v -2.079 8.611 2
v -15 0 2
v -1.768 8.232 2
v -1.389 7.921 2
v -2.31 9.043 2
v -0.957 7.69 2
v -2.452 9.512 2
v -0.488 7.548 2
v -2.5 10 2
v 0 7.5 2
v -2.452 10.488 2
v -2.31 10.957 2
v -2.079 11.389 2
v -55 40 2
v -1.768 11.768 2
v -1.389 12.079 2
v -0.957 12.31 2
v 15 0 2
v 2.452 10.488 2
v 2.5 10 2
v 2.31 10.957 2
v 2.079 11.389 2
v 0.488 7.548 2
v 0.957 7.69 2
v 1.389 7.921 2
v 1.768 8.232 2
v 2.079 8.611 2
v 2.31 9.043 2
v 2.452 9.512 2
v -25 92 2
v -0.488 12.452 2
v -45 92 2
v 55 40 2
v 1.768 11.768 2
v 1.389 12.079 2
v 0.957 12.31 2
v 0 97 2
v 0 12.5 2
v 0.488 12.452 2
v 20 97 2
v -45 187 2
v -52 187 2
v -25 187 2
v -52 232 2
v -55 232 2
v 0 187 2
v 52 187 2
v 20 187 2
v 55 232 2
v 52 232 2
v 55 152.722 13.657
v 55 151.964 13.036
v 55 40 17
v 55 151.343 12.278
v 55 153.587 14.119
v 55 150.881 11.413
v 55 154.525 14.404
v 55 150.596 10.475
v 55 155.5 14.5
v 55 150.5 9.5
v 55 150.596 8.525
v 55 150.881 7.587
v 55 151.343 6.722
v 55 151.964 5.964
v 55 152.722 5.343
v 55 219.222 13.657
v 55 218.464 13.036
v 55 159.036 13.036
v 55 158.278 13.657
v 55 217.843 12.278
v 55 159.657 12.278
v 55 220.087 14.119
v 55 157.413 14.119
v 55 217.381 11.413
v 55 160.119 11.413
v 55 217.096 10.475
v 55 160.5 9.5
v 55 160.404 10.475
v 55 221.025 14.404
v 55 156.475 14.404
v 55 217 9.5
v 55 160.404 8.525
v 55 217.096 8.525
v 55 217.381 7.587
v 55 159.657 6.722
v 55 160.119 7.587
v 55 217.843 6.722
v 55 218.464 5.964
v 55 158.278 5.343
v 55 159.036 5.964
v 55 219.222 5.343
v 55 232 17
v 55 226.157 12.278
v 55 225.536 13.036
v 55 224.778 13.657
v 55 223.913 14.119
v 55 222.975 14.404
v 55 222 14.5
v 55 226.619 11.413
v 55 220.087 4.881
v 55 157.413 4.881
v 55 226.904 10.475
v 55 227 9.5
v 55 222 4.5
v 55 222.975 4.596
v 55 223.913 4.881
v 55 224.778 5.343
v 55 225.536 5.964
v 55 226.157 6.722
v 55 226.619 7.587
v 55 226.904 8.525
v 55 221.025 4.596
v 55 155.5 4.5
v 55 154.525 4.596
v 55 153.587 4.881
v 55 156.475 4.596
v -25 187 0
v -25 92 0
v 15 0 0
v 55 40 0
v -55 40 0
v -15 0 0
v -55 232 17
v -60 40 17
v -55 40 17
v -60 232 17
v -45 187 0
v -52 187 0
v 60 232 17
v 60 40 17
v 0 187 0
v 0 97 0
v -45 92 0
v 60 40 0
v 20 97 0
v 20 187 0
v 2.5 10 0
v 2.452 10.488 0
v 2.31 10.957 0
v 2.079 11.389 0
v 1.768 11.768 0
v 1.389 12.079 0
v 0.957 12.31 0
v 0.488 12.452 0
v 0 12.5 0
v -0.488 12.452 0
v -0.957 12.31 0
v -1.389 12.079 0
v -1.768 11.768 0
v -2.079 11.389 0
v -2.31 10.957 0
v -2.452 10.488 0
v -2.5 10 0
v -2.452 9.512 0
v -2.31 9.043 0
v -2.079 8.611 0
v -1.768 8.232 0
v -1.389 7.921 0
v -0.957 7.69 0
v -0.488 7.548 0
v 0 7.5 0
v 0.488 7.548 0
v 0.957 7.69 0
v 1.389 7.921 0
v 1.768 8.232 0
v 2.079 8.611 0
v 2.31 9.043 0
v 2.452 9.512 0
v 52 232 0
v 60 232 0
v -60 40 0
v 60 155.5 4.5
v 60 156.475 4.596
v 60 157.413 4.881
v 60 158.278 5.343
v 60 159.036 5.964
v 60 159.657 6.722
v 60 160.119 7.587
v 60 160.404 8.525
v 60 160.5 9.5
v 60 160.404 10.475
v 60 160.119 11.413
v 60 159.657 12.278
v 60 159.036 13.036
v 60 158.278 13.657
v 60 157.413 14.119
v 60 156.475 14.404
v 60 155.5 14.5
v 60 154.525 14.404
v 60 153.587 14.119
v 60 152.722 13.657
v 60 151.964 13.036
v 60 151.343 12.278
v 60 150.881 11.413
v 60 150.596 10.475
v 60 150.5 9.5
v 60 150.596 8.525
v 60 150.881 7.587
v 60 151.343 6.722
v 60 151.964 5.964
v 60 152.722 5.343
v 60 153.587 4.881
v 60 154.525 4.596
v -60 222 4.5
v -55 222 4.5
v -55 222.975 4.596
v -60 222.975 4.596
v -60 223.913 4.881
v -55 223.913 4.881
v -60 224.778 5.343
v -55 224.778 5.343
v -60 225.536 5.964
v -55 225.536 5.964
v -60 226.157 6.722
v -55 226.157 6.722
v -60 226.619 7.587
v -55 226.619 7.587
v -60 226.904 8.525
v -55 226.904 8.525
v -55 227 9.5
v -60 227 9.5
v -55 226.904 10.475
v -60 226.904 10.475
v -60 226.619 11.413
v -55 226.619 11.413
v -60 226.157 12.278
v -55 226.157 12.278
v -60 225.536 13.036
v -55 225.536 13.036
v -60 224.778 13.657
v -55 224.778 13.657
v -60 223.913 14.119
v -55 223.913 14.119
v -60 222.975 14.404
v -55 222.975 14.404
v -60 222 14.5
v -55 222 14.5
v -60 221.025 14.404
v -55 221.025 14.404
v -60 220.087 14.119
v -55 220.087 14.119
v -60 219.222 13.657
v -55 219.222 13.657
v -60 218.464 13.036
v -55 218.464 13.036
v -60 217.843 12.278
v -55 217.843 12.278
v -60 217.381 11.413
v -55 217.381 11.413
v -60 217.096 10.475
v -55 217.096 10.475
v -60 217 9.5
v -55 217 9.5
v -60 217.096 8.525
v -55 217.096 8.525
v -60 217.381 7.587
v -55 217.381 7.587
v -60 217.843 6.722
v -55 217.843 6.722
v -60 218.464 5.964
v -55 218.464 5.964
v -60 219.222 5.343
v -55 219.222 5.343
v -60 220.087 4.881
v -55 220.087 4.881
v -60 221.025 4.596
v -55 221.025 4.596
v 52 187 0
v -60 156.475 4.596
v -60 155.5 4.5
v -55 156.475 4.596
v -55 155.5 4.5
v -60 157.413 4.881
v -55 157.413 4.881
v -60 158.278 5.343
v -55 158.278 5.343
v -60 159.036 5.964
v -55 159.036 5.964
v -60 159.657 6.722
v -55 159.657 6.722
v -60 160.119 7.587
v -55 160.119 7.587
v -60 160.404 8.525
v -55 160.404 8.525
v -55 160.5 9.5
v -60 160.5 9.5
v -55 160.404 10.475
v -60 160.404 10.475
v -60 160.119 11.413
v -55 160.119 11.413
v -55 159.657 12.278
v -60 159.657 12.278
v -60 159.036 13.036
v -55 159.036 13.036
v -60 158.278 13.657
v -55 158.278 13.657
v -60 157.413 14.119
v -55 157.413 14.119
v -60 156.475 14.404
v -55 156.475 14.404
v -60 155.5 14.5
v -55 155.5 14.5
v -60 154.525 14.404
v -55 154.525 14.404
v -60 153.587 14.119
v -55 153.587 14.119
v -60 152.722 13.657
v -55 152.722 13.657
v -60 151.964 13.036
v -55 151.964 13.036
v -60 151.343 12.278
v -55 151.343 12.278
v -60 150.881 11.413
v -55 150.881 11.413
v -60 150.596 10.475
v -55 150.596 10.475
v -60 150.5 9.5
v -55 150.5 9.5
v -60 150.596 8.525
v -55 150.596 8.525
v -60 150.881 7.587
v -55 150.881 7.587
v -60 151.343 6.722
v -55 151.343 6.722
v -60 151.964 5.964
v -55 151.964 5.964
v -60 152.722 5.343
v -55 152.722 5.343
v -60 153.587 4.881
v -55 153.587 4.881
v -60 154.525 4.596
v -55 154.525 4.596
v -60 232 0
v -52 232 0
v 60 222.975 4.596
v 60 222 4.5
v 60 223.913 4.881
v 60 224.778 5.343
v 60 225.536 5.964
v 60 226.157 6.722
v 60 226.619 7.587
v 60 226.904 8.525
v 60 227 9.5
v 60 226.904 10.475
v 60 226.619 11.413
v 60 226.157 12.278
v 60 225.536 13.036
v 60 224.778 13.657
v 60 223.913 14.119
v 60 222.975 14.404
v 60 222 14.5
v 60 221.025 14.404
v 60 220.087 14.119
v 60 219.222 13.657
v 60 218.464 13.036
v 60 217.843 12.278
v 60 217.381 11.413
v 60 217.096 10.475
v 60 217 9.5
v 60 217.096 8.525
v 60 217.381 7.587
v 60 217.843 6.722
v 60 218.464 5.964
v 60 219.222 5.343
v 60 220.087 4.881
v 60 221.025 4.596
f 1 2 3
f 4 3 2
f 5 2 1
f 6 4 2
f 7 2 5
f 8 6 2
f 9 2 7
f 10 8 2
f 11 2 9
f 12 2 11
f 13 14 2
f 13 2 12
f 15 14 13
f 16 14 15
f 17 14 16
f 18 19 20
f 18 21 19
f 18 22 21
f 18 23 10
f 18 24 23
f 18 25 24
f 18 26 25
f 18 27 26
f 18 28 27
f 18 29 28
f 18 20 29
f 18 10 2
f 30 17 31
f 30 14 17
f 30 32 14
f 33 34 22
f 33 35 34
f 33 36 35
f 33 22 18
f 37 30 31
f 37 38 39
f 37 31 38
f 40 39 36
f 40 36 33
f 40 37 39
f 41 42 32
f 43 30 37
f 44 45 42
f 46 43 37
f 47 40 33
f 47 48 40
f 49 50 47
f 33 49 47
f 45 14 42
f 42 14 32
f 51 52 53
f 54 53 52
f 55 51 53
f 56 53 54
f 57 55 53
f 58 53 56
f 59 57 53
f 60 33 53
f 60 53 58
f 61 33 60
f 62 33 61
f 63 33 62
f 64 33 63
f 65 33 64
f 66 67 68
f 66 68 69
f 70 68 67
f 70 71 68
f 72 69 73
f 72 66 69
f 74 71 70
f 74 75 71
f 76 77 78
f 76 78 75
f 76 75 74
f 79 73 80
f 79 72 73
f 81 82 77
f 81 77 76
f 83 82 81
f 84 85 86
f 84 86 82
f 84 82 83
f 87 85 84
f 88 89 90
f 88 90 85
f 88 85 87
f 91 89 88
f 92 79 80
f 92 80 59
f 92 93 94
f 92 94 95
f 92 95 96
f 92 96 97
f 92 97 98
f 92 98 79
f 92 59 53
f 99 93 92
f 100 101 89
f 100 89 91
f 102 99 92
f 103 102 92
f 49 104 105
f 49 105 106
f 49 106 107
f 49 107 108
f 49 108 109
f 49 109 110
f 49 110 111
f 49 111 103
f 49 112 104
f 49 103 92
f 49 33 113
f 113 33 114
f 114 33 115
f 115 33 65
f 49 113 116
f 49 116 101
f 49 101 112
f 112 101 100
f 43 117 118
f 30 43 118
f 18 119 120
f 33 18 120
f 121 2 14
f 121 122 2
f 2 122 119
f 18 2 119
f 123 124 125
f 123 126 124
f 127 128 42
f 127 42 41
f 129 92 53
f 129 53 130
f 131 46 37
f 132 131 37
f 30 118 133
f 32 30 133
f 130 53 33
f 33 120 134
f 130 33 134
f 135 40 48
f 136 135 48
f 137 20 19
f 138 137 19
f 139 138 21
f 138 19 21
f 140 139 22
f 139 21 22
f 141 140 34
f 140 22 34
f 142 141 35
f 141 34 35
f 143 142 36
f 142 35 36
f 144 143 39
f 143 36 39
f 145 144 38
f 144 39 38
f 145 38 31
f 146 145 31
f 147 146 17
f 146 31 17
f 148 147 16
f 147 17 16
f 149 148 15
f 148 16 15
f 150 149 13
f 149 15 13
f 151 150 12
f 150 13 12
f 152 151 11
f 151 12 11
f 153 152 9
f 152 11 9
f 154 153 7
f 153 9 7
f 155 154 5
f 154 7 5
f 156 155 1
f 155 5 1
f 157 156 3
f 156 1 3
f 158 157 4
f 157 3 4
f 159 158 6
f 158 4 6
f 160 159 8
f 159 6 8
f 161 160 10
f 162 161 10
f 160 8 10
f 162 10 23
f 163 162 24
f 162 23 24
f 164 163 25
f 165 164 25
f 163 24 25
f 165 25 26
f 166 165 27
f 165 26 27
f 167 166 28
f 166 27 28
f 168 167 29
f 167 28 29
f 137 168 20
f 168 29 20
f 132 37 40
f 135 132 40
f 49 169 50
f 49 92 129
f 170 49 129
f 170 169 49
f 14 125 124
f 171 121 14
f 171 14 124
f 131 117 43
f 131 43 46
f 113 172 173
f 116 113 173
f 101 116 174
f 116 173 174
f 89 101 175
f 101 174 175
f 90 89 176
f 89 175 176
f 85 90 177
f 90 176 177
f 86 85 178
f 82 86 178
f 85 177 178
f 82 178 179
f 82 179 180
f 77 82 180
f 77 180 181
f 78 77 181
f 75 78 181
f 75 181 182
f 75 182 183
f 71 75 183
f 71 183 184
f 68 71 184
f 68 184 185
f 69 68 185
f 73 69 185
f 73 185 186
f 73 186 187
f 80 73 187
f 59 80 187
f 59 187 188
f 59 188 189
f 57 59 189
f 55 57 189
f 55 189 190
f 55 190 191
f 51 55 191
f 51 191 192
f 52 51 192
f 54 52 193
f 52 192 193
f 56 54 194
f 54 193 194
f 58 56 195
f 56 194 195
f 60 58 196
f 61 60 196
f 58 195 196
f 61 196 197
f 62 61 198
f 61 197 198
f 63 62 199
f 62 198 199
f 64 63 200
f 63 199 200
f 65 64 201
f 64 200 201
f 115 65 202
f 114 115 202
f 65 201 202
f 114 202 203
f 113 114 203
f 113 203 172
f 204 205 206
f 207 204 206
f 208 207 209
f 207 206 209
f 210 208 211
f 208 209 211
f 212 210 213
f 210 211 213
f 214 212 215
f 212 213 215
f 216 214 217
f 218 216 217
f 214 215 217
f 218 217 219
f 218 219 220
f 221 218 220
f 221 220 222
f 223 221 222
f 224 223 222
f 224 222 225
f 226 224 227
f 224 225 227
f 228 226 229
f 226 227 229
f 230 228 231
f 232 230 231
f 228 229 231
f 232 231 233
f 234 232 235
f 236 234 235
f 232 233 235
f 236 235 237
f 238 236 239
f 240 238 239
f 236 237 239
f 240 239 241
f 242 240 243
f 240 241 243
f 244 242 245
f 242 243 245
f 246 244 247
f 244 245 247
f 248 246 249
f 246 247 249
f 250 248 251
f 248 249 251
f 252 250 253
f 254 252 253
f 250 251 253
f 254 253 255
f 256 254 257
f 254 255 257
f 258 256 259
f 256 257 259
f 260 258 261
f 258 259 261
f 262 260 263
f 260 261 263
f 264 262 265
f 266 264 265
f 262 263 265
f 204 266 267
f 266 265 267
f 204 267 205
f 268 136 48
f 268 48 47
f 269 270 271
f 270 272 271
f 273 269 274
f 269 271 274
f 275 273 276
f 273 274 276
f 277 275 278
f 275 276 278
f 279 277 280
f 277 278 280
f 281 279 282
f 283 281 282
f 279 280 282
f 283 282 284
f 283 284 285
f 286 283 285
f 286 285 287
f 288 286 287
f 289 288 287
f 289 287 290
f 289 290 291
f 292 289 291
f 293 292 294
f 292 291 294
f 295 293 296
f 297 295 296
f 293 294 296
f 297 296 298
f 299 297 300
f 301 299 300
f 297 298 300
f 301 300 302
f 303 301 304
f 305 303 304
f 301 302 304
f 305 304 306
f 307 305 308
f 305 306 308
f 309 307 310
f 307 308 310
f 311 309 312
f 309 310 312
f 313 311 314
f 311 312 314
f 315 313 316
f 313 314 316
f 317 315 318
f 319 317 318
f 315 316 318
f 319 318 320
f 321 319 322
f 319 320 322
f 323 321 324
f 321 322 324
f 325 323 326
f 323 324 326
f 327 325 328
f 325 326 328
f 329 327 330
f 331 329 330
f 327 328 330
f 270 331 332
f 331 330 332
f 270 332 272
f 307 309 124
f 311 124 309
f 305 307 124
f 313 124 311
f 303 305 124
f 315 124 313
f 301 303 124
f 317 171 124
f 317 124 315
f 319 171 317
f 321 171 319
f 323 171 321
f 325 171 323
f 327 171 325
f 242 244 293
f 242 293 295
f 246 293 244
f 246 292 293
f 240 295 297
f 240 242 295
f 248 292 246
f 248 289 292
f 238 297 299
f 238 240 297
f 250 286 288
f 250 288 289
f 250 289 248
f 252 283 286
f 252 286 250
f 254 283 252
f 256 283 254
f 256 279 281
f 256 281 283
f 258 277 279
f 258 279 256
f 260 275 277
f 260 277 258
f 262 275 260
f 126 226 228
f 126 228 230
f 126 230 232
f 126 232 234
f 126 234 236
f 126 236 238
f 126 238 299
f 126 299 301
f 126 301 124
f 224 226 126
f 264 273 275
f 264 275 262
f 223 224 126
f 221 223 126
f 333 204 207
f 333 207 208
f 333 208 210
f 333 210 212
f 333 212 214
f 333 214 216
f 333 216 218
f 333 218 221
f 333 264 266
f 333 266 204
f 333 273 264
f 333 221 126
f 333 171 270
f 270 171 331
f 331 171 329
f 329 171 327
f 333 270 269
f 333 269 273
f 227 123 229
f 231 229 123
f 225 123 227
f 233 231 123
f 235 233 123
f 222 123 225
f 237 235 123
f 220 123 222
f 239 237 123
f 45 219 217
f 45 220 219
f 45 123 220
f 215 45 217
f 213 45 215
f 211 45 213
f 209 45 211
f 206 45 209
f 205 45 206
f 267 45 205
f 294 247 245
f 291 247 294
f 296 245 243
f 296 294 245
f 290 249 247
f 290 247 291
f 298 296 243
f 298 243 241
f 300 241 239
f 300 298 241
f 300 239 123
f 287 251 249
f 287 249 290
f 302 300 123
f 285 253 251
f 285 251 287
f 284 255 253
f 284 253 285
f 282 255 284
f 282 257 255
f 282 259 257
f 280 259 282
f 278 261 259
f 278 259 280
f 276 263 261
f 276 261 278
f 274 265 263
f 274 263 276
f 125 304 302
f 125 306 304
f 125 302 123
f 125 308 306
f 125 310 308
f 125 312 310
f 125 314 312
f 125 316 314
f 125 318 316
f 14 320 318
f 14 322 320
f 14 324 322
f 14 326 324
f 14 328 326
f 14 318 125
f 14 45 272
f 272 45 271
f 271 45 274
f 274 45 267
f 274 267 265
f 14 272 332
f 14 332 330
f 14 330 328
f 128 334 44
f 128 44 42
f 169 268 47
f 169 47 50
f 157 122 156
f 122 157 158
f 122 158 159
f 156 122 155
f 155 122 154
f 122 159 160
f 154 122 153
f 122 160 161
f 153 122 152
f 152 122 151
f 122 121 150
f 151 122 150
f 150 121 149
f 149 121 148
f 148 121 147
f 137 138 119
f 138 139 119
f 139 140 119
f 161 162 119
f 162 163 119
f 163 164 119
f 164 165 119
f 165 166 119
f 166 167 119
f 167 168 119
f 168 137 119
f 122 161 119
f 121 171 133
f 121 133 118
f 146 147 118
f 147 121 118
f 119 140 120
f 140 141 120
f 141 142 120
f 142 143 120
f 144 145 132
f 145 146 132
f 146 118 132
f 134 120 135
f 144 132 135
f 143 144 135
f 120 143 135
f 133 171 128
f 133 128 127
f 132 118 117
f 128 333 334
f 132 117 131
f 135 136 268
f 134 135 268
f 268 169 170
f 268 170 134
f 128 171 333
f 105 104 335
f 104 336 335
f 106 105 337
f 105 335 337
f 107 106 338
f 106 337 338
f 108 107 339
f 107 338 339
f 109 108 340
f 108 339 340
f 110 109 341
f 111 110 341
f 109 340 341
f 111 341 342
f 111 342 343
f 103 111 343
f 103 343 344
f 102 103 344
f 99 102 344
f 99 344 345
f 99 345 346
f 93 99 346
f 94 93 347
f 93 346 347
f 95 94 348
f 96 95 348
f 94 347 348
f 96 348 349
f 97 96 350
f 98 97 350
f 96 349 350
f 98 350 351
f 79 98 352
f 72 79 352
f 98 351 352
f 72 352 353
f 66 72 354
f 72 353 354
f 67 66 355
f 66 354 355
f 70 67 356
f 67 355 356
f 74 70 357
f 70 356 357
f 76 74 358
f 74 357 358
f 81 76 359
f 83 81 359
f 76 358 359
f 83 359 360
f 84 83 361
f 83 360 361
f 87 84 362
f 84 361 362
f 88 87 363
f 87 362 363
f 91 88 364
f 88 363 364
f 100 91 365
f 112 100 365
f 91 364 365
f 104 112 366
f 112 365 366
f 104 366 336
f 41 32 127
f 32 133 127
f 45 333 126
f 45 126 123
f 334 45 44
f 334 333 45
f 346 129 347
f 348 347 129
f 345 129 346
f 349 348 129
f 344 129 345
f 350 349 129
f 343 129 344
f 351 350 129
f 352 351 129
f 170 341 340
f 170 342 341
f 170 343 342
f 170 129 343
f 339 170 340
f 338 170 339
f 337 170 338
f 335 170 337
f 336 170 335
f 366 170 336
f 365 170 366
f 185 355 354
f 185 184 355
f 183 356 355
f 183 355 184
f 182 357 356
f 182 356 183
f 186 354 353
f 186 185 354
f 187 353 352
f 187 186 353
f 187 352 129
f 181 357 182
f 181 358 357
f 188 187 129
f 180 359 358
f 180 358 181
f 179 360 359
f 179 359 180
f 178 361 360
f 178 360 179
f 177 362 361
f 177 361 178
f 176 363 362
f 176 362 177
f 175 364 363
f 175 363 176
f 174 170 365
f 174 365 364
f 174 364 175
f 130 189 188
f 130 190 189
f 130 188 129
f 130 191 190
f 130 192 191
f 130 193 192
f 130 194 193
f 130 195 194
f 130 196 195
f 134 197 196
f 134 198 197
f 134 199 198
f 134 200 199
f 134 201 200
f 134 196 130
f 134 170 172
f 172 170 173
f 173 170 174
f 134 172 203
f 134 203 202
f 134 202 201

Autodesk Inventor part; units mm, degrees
ref_plane "YZ Plane" through (0, 0, 0) normal (1, 0, 0) x (0, 1, 0)
ref_plane "XZ Plane" through (0, 0, 0) normal (0, 1, 0) x (-1, 0, 0)
sketch "草图1" plane through (0, 0, 0) normal (0, 0, 1) x (1, 0, 0)
  line L0 (-60, 0) -> (60, 0)
  line L1 (-60, 0) -> (-60, 232)
  line L2 (-60, 232) -> (60, 232)
  line L3 (60, 232) -> (60, 0)
  point P0 (0, 0)
  point P1 (0, 0)
  dimension "宽度" = 120
  dimension "长度" = 232
  dimension "d15" = 120
extrude "拉伸1" add sketch "草图1" along normal blind 2
sketch "草图2" plane through (0, 0, 2) normal (0, 0, 1) x (1, 0, 0)
  line L0 (-60, 0) -> (60, 0) projected
  line L1 (60, 0) -> (60, 232) projected
  line L2 (60, 232) -> (-60, 232) projected
  line L3 (-60, 232) -> (-60, 0) projected
  line L4 (-55, 232) -> (-55, 0)
  line L5 (0, 0) -> (0, 232) construction
  line L6 (55, 0) -> (55, 232)
  dimension "侧厚" = 5
extrude "拉伸2" add sketch "草图2" along normal blind 15 contours L3 L2 L4 L0 | L6 L2 L1 L0
sketch "草图3" plane through (60, 0, 0) normal (1, 0, 0) x (0, 0, -1)
  line L0 (0, 0) -> (0, 232) projected
  line L1 (0, 232) -> (-17, 232) projected
  line L2 (-17, 0) -> (-17, 232) projected
  line L3 (0, 0) -> (-17, 0) projected
  circle A0 centre (-9.5, 222) radius 5
  circle A1 centre (-9.5, 155.5) radius 5
  line L4 (-9.5, 222) -> (-9.5, 155.5) construction
  point P0 (0, 0)
  dimension "d16" = 10
  dimension "后孔位置" = 10
  dimension "上沿" = 7.5
  dimension "d29" = 10
  dimension "d30" = 66.5
extrude "拉伸3" cut sketch "草图3" against normal through all contours A0
sketch "草图4" plane through (0, 0, 2) normal (0, 0, 1) x (1, 0, 0)
  line L0 (-52, 232) -> (-52, 187)
  line L1 (-52, 187) -> (52, 187)
  line L2 (52, 187) -> (52, 232)
  line L3 (55, 232) -> (-55, 232)
  line L4 (0, 232) -> (0, 179.736464)
  line L5 (-52, 232) -> (52, 232)
  line L6 (55, 232) -> (55, 0)
  point P0 (0, 0)
  dimension "d26" = 45
  dimension "d39" = 3
extrude "拉伸4" cut sketch "草图4" along normal through all both and the other way through all
extrude "拉伸5" cut sketch "草图3" against normal through all contours A1
sketch "草图5" plane through (0, 0, 2) normal (0, 0, 1) x (1, 0, 0)
  line L0 (-55, 0) -> (-55, 232) projected
  line L1 (-52, 232) -> (-55, 232) projected
  line L2 (-45, 232) -> (-45, 92)
  line L3 (-25, 232) -> (-25, 92)
  line L4 (-45, 92) -> (-25, 92)
  point P0 (0, 0)
  dimension "d33" = 140
  dimension "d34" = 10
  dimension "d35" = 140
  dimension "d36" = 20
sketch "草图5 outline for 拉伸6" plane through (0, 0, 2) normal (0, 0, 1) x (1, 0, 0)
  line L0 (-45, 232) -> (-25, 232)
  line L1 (-25, 232) -> (-25, 92)
  line L2 (-25, 92) -> (-45, 92)
  line L3 (-45, 92) -> (-45, 232)
extrude "拉伸6" cut sketch "草图5 outline for 拉伸6" along normal through all both and the other way through all
sketch "草图6" plane through (0, 0, 2) normal (0, 0, 1) x (1, 0, 0)
  line L0 (60, 160.5) -> (60, 150.5) projected
  line L1 (55, 150.5) -> (55, 160.5) projected
  line L2 (55, 155.5) -> (0, 155.5) construction
  line L3 (0, 145.5) -> (0, 0) construction
  line L4 (55, 155.5) -> (55, 95.5) construction
  line L5 (55, 95.5) -> (0, 95.5) construction
  line L6 (-10, 95.5) -> (10, 95.5)
  line L7 (52, 187) -> (-25, 187) projected
  line L8 (10, 145.5) -> (10, 177) construction
  line L9 (0, 187) -> (0, 97)
  line L10 (0, 97) -> (20, 97)
  line L11 (20, 97) -> (20, 187)
  dimension "d40" = 60
  dimension "d46" = 90
  dimension "d47" = 20
  dimension "d48" = 10
extrude "拉伸7" cut sketch "草图6" against normal through all
sketch "草图7" plane through (0, 0, 2) normal (0, 0, 1) x (1, 0, 0)
  line L0 (60, 227) -> (60, 217) projected
  line L1 (55, 217) -> (55, 227) projected
  line L2 (-60, 232) -> (-60, 0) projected
  line L3 (60, 0) -> (60, 232) projected
  line L4 (-60, 0) -> (60, 0) projected
  line L5 (55, 222) -> (60, 222) construction
  circle A0 centre (0, 10) radius 2.5
  point P0 (0, 0)
  dimension "d49" = 5
  dimension "d50" = 212
extrude "拉伸8" cut sketch "草图7" against normal through all
sketch "草图8" plane through (0, 0, 2) normal (0, 0, 1) x (1, 0, 0)
  circle A0 centre (0, 10) radius 2.5
  line L0 (20, 187) -> (20, 97)
  line L1 (20, 97) -> (0, 97)
  line L2 (0, 97) -> (0, 187)
  line L3 (0, 187) -> (-25, 187)
  line L4 (-25, 187) -> (-25, 92)
  line L5 (-25, 92) -> (-45, 92)
  line L6 (-45, 92) -> (-45, 187)
  line L7 (-45, 187) -> (-52, 187)
  line L8 (-52, 187) -> (-52, 232)
  line L9 (-52, 232) -> (-55, 232)
  line L10 (-55, 232) -> (-55, 0)
  line L11 (-55, 0) -> (55, 0)
  line L12 (55, 0) -> (55, 232)
  line L13 (55, 232) -> (52, 232)
  line L14 (52, 232) -> (52, 187)
  line L15 (52, 187) -> (20, 187)
  line L16 (-60, 0) -> (-55, 0)
  line L17 (-55, 0) -> (-55, 232)
  line L18 (-55, 232) -> (-60, 232)
  line L19 (-60, 232) -> (-60, 0)
  line L20 (60, 0) -> (60, 232)
  line L21 (60, 232) -> (55, 232)
  line L22 (55, 232) -> (55, 0)
  line L23 (55, 0) -> (60, 0)
  line L24 (-15, 0) -> (-55, 40)
  line L25 (15, 0) -> (55, 40)
  line L26 (0, 0) -> (0, 39.183664) construction
  line L27 (-60, 232) -> (-60, 0)
  line L28 (-55, 40) -> (-60, 40)
  line L29 (-60, 40) -> (-60, 0)
  line L30 (-60, 0) -> (-15, 0)
  line L31 (15, 0) -> (60, 0)
  line L32 (55, 40) -> (60, 40)
  line L33 (60, 0) -> (60, 40)
  dimension "d53" = 30
  dimension "d55" = 40
extrude "拉伸9" cut sketch "草图8" along normal through all both and the other way through all contours L32 L20 L23 L12 | L12 L11 L25 | L11 L10 L24 | L16 L19 L28 L10
ref_plane "工作平面1" through (31, 232, 17) normal (1, 0, 0) x (0, 0, -1)
sketch "草图9" plane through (31, 232, 17) normal (1, 0, 0) x (0, 0, -1)
  line L0 (17, -192) -> (17, 0)
  line L1 (17, -56.209089) -> (-323, -175.94833)
  line L2 (-322.950917, -180.94833) -> (17, -61.209089)
  line L3 (17, -56.209089) -> (17, -61.209089)
  line L4 (-322.950917, -180.94833) -> (-323, -175.94833)
  point P0 (17, -232)
  dimension "d59" = 340
  dimension "d64" = 5
  dimension "d65" = 5
extrude "拉伸11" [suppressed]
properties part number "底板" material "木材(桦木)"
